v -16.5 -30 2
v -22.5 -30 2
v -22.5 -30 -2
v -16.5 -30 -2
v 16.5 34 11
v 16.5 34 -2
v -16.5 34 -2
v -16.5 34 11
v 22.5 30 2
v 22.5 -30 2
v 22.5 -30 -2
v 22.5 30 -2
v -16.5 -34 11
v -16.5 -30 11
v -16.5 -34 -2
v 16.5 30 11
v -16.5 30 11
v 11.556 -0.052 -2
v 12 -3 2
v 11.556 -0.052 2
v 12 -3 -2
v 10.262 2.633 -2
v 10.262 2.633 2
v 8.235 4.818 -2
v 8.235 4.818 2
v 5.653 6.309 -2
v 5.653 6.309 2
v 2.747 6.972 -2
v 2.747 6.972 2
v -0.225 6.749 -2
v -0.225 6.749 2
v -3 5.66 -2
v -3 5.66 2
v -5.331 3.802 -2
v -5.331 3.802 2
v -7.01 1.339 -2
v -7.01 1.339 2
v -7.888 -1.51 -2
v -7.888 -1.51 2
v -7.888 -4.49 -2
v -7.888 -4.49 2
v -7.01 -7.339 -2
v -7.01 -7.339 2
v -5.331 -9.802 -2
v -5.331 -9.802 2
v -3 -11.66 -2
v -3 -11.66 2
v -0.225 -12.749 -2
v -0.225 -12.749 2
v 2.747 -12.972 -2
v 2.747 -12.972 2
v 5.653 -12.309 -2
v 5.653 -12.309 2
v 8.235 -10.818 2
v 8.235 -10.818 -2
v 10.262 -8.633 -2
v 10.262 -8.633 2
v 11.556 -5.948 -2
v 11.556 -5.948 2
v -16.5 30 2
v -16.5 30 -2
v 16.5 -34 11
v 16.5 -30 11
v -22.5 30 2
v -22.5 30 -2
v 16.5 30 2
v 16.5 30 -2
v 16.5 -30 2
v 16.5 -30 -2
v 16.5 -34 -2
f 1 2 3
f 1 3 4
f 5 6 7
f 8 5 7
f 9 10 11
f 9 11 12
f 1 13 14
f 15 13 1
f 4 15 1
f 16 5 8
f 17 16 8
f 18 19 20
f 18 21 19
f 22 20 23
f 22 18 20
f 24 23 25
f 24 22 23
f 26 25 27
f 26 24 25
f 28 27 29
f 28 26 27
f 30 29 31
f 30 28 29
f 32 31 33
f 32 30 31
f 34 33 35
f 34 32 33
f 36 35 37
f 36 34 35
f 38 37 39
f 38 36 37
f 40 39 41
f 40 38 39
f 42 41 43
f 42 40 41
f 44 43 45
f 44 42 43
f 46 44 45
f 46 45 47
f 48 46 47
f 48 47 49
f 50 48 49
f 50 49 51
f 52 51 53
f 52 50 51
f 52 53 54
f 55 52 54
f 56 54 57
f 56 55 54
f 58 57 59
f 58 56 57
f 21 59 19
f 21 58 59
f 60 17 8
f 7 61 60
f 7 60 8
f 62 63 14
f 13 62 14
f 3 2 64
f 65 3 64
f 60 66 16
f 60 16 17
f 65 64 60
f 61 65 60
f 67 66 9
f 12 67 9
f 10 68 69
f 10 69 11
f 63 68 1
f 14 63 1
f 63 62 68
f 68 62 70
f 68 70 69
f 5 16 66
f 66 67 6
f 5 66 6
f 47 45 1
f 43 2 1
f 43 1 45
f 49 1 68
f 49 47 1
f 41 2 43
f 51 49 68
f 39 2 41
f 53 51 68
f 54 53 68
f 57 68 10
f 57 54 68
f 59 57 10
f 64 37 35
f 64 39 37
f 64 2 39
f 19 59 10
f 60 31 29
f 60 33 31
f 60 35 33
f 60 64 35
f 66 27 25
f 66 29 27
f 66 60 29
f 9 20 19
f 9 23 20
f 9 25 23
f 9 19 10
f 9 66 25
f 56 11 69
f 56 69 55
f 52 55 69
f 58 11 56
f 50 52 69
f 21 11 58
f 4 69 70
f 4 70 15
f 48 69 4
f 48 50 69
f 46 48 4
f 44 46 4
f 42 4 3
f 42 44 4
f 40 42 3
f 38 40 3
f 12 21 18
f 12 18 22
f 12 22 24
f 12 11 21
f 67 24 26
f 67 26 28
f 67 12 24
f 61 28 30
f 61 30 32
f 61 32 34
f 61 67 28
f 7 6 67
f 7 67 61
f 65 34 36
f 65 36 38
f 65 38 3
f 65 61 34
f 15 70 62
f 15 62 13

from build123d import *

# Parameters (mm, degrees)
SKETCH1_W           = 45
SKETCH1_H           = 60
SKETCH1_R           = 10
BOSS_EXTRUDE1_DEPTH = 2
SKETCH3_W           = 33
SKETCH3_H           = 4
BOSS_EXTRUDE3_DEPTH = 13


with BuildPart() as part:
    # Sketch1 → Boss-Extrude1 (new, symmetric)
    with BuildSketch(Plane.XY):
        Rectangle(SKETCH1_W, SKETCH1_H)
        with Locations((2, -3)):
            Circle(SKETCH1_R, mode=Mode.SUBTRACT)
    extrude(amount=BOSS_EXTRUDE1_DEPTH, both=True)

    # Sketch3 → Boss-Extrude3 (add)
    with BuildSketch(Plane(origin=(0, 0, -2), x_dir=(-1, 0, 0), z_dir=(0, 0, -1))):
        with Locations((0, 32)):
            Rectangle(SKETCH3_W, SKETCH3_H)
        with Locations((0, -32)):
            Rectangle(SKETCH3_W, SKETCH3_H)
    extrude(amount=-BOSS_EXTRUDE3_DEPTH)


solid = part.part
